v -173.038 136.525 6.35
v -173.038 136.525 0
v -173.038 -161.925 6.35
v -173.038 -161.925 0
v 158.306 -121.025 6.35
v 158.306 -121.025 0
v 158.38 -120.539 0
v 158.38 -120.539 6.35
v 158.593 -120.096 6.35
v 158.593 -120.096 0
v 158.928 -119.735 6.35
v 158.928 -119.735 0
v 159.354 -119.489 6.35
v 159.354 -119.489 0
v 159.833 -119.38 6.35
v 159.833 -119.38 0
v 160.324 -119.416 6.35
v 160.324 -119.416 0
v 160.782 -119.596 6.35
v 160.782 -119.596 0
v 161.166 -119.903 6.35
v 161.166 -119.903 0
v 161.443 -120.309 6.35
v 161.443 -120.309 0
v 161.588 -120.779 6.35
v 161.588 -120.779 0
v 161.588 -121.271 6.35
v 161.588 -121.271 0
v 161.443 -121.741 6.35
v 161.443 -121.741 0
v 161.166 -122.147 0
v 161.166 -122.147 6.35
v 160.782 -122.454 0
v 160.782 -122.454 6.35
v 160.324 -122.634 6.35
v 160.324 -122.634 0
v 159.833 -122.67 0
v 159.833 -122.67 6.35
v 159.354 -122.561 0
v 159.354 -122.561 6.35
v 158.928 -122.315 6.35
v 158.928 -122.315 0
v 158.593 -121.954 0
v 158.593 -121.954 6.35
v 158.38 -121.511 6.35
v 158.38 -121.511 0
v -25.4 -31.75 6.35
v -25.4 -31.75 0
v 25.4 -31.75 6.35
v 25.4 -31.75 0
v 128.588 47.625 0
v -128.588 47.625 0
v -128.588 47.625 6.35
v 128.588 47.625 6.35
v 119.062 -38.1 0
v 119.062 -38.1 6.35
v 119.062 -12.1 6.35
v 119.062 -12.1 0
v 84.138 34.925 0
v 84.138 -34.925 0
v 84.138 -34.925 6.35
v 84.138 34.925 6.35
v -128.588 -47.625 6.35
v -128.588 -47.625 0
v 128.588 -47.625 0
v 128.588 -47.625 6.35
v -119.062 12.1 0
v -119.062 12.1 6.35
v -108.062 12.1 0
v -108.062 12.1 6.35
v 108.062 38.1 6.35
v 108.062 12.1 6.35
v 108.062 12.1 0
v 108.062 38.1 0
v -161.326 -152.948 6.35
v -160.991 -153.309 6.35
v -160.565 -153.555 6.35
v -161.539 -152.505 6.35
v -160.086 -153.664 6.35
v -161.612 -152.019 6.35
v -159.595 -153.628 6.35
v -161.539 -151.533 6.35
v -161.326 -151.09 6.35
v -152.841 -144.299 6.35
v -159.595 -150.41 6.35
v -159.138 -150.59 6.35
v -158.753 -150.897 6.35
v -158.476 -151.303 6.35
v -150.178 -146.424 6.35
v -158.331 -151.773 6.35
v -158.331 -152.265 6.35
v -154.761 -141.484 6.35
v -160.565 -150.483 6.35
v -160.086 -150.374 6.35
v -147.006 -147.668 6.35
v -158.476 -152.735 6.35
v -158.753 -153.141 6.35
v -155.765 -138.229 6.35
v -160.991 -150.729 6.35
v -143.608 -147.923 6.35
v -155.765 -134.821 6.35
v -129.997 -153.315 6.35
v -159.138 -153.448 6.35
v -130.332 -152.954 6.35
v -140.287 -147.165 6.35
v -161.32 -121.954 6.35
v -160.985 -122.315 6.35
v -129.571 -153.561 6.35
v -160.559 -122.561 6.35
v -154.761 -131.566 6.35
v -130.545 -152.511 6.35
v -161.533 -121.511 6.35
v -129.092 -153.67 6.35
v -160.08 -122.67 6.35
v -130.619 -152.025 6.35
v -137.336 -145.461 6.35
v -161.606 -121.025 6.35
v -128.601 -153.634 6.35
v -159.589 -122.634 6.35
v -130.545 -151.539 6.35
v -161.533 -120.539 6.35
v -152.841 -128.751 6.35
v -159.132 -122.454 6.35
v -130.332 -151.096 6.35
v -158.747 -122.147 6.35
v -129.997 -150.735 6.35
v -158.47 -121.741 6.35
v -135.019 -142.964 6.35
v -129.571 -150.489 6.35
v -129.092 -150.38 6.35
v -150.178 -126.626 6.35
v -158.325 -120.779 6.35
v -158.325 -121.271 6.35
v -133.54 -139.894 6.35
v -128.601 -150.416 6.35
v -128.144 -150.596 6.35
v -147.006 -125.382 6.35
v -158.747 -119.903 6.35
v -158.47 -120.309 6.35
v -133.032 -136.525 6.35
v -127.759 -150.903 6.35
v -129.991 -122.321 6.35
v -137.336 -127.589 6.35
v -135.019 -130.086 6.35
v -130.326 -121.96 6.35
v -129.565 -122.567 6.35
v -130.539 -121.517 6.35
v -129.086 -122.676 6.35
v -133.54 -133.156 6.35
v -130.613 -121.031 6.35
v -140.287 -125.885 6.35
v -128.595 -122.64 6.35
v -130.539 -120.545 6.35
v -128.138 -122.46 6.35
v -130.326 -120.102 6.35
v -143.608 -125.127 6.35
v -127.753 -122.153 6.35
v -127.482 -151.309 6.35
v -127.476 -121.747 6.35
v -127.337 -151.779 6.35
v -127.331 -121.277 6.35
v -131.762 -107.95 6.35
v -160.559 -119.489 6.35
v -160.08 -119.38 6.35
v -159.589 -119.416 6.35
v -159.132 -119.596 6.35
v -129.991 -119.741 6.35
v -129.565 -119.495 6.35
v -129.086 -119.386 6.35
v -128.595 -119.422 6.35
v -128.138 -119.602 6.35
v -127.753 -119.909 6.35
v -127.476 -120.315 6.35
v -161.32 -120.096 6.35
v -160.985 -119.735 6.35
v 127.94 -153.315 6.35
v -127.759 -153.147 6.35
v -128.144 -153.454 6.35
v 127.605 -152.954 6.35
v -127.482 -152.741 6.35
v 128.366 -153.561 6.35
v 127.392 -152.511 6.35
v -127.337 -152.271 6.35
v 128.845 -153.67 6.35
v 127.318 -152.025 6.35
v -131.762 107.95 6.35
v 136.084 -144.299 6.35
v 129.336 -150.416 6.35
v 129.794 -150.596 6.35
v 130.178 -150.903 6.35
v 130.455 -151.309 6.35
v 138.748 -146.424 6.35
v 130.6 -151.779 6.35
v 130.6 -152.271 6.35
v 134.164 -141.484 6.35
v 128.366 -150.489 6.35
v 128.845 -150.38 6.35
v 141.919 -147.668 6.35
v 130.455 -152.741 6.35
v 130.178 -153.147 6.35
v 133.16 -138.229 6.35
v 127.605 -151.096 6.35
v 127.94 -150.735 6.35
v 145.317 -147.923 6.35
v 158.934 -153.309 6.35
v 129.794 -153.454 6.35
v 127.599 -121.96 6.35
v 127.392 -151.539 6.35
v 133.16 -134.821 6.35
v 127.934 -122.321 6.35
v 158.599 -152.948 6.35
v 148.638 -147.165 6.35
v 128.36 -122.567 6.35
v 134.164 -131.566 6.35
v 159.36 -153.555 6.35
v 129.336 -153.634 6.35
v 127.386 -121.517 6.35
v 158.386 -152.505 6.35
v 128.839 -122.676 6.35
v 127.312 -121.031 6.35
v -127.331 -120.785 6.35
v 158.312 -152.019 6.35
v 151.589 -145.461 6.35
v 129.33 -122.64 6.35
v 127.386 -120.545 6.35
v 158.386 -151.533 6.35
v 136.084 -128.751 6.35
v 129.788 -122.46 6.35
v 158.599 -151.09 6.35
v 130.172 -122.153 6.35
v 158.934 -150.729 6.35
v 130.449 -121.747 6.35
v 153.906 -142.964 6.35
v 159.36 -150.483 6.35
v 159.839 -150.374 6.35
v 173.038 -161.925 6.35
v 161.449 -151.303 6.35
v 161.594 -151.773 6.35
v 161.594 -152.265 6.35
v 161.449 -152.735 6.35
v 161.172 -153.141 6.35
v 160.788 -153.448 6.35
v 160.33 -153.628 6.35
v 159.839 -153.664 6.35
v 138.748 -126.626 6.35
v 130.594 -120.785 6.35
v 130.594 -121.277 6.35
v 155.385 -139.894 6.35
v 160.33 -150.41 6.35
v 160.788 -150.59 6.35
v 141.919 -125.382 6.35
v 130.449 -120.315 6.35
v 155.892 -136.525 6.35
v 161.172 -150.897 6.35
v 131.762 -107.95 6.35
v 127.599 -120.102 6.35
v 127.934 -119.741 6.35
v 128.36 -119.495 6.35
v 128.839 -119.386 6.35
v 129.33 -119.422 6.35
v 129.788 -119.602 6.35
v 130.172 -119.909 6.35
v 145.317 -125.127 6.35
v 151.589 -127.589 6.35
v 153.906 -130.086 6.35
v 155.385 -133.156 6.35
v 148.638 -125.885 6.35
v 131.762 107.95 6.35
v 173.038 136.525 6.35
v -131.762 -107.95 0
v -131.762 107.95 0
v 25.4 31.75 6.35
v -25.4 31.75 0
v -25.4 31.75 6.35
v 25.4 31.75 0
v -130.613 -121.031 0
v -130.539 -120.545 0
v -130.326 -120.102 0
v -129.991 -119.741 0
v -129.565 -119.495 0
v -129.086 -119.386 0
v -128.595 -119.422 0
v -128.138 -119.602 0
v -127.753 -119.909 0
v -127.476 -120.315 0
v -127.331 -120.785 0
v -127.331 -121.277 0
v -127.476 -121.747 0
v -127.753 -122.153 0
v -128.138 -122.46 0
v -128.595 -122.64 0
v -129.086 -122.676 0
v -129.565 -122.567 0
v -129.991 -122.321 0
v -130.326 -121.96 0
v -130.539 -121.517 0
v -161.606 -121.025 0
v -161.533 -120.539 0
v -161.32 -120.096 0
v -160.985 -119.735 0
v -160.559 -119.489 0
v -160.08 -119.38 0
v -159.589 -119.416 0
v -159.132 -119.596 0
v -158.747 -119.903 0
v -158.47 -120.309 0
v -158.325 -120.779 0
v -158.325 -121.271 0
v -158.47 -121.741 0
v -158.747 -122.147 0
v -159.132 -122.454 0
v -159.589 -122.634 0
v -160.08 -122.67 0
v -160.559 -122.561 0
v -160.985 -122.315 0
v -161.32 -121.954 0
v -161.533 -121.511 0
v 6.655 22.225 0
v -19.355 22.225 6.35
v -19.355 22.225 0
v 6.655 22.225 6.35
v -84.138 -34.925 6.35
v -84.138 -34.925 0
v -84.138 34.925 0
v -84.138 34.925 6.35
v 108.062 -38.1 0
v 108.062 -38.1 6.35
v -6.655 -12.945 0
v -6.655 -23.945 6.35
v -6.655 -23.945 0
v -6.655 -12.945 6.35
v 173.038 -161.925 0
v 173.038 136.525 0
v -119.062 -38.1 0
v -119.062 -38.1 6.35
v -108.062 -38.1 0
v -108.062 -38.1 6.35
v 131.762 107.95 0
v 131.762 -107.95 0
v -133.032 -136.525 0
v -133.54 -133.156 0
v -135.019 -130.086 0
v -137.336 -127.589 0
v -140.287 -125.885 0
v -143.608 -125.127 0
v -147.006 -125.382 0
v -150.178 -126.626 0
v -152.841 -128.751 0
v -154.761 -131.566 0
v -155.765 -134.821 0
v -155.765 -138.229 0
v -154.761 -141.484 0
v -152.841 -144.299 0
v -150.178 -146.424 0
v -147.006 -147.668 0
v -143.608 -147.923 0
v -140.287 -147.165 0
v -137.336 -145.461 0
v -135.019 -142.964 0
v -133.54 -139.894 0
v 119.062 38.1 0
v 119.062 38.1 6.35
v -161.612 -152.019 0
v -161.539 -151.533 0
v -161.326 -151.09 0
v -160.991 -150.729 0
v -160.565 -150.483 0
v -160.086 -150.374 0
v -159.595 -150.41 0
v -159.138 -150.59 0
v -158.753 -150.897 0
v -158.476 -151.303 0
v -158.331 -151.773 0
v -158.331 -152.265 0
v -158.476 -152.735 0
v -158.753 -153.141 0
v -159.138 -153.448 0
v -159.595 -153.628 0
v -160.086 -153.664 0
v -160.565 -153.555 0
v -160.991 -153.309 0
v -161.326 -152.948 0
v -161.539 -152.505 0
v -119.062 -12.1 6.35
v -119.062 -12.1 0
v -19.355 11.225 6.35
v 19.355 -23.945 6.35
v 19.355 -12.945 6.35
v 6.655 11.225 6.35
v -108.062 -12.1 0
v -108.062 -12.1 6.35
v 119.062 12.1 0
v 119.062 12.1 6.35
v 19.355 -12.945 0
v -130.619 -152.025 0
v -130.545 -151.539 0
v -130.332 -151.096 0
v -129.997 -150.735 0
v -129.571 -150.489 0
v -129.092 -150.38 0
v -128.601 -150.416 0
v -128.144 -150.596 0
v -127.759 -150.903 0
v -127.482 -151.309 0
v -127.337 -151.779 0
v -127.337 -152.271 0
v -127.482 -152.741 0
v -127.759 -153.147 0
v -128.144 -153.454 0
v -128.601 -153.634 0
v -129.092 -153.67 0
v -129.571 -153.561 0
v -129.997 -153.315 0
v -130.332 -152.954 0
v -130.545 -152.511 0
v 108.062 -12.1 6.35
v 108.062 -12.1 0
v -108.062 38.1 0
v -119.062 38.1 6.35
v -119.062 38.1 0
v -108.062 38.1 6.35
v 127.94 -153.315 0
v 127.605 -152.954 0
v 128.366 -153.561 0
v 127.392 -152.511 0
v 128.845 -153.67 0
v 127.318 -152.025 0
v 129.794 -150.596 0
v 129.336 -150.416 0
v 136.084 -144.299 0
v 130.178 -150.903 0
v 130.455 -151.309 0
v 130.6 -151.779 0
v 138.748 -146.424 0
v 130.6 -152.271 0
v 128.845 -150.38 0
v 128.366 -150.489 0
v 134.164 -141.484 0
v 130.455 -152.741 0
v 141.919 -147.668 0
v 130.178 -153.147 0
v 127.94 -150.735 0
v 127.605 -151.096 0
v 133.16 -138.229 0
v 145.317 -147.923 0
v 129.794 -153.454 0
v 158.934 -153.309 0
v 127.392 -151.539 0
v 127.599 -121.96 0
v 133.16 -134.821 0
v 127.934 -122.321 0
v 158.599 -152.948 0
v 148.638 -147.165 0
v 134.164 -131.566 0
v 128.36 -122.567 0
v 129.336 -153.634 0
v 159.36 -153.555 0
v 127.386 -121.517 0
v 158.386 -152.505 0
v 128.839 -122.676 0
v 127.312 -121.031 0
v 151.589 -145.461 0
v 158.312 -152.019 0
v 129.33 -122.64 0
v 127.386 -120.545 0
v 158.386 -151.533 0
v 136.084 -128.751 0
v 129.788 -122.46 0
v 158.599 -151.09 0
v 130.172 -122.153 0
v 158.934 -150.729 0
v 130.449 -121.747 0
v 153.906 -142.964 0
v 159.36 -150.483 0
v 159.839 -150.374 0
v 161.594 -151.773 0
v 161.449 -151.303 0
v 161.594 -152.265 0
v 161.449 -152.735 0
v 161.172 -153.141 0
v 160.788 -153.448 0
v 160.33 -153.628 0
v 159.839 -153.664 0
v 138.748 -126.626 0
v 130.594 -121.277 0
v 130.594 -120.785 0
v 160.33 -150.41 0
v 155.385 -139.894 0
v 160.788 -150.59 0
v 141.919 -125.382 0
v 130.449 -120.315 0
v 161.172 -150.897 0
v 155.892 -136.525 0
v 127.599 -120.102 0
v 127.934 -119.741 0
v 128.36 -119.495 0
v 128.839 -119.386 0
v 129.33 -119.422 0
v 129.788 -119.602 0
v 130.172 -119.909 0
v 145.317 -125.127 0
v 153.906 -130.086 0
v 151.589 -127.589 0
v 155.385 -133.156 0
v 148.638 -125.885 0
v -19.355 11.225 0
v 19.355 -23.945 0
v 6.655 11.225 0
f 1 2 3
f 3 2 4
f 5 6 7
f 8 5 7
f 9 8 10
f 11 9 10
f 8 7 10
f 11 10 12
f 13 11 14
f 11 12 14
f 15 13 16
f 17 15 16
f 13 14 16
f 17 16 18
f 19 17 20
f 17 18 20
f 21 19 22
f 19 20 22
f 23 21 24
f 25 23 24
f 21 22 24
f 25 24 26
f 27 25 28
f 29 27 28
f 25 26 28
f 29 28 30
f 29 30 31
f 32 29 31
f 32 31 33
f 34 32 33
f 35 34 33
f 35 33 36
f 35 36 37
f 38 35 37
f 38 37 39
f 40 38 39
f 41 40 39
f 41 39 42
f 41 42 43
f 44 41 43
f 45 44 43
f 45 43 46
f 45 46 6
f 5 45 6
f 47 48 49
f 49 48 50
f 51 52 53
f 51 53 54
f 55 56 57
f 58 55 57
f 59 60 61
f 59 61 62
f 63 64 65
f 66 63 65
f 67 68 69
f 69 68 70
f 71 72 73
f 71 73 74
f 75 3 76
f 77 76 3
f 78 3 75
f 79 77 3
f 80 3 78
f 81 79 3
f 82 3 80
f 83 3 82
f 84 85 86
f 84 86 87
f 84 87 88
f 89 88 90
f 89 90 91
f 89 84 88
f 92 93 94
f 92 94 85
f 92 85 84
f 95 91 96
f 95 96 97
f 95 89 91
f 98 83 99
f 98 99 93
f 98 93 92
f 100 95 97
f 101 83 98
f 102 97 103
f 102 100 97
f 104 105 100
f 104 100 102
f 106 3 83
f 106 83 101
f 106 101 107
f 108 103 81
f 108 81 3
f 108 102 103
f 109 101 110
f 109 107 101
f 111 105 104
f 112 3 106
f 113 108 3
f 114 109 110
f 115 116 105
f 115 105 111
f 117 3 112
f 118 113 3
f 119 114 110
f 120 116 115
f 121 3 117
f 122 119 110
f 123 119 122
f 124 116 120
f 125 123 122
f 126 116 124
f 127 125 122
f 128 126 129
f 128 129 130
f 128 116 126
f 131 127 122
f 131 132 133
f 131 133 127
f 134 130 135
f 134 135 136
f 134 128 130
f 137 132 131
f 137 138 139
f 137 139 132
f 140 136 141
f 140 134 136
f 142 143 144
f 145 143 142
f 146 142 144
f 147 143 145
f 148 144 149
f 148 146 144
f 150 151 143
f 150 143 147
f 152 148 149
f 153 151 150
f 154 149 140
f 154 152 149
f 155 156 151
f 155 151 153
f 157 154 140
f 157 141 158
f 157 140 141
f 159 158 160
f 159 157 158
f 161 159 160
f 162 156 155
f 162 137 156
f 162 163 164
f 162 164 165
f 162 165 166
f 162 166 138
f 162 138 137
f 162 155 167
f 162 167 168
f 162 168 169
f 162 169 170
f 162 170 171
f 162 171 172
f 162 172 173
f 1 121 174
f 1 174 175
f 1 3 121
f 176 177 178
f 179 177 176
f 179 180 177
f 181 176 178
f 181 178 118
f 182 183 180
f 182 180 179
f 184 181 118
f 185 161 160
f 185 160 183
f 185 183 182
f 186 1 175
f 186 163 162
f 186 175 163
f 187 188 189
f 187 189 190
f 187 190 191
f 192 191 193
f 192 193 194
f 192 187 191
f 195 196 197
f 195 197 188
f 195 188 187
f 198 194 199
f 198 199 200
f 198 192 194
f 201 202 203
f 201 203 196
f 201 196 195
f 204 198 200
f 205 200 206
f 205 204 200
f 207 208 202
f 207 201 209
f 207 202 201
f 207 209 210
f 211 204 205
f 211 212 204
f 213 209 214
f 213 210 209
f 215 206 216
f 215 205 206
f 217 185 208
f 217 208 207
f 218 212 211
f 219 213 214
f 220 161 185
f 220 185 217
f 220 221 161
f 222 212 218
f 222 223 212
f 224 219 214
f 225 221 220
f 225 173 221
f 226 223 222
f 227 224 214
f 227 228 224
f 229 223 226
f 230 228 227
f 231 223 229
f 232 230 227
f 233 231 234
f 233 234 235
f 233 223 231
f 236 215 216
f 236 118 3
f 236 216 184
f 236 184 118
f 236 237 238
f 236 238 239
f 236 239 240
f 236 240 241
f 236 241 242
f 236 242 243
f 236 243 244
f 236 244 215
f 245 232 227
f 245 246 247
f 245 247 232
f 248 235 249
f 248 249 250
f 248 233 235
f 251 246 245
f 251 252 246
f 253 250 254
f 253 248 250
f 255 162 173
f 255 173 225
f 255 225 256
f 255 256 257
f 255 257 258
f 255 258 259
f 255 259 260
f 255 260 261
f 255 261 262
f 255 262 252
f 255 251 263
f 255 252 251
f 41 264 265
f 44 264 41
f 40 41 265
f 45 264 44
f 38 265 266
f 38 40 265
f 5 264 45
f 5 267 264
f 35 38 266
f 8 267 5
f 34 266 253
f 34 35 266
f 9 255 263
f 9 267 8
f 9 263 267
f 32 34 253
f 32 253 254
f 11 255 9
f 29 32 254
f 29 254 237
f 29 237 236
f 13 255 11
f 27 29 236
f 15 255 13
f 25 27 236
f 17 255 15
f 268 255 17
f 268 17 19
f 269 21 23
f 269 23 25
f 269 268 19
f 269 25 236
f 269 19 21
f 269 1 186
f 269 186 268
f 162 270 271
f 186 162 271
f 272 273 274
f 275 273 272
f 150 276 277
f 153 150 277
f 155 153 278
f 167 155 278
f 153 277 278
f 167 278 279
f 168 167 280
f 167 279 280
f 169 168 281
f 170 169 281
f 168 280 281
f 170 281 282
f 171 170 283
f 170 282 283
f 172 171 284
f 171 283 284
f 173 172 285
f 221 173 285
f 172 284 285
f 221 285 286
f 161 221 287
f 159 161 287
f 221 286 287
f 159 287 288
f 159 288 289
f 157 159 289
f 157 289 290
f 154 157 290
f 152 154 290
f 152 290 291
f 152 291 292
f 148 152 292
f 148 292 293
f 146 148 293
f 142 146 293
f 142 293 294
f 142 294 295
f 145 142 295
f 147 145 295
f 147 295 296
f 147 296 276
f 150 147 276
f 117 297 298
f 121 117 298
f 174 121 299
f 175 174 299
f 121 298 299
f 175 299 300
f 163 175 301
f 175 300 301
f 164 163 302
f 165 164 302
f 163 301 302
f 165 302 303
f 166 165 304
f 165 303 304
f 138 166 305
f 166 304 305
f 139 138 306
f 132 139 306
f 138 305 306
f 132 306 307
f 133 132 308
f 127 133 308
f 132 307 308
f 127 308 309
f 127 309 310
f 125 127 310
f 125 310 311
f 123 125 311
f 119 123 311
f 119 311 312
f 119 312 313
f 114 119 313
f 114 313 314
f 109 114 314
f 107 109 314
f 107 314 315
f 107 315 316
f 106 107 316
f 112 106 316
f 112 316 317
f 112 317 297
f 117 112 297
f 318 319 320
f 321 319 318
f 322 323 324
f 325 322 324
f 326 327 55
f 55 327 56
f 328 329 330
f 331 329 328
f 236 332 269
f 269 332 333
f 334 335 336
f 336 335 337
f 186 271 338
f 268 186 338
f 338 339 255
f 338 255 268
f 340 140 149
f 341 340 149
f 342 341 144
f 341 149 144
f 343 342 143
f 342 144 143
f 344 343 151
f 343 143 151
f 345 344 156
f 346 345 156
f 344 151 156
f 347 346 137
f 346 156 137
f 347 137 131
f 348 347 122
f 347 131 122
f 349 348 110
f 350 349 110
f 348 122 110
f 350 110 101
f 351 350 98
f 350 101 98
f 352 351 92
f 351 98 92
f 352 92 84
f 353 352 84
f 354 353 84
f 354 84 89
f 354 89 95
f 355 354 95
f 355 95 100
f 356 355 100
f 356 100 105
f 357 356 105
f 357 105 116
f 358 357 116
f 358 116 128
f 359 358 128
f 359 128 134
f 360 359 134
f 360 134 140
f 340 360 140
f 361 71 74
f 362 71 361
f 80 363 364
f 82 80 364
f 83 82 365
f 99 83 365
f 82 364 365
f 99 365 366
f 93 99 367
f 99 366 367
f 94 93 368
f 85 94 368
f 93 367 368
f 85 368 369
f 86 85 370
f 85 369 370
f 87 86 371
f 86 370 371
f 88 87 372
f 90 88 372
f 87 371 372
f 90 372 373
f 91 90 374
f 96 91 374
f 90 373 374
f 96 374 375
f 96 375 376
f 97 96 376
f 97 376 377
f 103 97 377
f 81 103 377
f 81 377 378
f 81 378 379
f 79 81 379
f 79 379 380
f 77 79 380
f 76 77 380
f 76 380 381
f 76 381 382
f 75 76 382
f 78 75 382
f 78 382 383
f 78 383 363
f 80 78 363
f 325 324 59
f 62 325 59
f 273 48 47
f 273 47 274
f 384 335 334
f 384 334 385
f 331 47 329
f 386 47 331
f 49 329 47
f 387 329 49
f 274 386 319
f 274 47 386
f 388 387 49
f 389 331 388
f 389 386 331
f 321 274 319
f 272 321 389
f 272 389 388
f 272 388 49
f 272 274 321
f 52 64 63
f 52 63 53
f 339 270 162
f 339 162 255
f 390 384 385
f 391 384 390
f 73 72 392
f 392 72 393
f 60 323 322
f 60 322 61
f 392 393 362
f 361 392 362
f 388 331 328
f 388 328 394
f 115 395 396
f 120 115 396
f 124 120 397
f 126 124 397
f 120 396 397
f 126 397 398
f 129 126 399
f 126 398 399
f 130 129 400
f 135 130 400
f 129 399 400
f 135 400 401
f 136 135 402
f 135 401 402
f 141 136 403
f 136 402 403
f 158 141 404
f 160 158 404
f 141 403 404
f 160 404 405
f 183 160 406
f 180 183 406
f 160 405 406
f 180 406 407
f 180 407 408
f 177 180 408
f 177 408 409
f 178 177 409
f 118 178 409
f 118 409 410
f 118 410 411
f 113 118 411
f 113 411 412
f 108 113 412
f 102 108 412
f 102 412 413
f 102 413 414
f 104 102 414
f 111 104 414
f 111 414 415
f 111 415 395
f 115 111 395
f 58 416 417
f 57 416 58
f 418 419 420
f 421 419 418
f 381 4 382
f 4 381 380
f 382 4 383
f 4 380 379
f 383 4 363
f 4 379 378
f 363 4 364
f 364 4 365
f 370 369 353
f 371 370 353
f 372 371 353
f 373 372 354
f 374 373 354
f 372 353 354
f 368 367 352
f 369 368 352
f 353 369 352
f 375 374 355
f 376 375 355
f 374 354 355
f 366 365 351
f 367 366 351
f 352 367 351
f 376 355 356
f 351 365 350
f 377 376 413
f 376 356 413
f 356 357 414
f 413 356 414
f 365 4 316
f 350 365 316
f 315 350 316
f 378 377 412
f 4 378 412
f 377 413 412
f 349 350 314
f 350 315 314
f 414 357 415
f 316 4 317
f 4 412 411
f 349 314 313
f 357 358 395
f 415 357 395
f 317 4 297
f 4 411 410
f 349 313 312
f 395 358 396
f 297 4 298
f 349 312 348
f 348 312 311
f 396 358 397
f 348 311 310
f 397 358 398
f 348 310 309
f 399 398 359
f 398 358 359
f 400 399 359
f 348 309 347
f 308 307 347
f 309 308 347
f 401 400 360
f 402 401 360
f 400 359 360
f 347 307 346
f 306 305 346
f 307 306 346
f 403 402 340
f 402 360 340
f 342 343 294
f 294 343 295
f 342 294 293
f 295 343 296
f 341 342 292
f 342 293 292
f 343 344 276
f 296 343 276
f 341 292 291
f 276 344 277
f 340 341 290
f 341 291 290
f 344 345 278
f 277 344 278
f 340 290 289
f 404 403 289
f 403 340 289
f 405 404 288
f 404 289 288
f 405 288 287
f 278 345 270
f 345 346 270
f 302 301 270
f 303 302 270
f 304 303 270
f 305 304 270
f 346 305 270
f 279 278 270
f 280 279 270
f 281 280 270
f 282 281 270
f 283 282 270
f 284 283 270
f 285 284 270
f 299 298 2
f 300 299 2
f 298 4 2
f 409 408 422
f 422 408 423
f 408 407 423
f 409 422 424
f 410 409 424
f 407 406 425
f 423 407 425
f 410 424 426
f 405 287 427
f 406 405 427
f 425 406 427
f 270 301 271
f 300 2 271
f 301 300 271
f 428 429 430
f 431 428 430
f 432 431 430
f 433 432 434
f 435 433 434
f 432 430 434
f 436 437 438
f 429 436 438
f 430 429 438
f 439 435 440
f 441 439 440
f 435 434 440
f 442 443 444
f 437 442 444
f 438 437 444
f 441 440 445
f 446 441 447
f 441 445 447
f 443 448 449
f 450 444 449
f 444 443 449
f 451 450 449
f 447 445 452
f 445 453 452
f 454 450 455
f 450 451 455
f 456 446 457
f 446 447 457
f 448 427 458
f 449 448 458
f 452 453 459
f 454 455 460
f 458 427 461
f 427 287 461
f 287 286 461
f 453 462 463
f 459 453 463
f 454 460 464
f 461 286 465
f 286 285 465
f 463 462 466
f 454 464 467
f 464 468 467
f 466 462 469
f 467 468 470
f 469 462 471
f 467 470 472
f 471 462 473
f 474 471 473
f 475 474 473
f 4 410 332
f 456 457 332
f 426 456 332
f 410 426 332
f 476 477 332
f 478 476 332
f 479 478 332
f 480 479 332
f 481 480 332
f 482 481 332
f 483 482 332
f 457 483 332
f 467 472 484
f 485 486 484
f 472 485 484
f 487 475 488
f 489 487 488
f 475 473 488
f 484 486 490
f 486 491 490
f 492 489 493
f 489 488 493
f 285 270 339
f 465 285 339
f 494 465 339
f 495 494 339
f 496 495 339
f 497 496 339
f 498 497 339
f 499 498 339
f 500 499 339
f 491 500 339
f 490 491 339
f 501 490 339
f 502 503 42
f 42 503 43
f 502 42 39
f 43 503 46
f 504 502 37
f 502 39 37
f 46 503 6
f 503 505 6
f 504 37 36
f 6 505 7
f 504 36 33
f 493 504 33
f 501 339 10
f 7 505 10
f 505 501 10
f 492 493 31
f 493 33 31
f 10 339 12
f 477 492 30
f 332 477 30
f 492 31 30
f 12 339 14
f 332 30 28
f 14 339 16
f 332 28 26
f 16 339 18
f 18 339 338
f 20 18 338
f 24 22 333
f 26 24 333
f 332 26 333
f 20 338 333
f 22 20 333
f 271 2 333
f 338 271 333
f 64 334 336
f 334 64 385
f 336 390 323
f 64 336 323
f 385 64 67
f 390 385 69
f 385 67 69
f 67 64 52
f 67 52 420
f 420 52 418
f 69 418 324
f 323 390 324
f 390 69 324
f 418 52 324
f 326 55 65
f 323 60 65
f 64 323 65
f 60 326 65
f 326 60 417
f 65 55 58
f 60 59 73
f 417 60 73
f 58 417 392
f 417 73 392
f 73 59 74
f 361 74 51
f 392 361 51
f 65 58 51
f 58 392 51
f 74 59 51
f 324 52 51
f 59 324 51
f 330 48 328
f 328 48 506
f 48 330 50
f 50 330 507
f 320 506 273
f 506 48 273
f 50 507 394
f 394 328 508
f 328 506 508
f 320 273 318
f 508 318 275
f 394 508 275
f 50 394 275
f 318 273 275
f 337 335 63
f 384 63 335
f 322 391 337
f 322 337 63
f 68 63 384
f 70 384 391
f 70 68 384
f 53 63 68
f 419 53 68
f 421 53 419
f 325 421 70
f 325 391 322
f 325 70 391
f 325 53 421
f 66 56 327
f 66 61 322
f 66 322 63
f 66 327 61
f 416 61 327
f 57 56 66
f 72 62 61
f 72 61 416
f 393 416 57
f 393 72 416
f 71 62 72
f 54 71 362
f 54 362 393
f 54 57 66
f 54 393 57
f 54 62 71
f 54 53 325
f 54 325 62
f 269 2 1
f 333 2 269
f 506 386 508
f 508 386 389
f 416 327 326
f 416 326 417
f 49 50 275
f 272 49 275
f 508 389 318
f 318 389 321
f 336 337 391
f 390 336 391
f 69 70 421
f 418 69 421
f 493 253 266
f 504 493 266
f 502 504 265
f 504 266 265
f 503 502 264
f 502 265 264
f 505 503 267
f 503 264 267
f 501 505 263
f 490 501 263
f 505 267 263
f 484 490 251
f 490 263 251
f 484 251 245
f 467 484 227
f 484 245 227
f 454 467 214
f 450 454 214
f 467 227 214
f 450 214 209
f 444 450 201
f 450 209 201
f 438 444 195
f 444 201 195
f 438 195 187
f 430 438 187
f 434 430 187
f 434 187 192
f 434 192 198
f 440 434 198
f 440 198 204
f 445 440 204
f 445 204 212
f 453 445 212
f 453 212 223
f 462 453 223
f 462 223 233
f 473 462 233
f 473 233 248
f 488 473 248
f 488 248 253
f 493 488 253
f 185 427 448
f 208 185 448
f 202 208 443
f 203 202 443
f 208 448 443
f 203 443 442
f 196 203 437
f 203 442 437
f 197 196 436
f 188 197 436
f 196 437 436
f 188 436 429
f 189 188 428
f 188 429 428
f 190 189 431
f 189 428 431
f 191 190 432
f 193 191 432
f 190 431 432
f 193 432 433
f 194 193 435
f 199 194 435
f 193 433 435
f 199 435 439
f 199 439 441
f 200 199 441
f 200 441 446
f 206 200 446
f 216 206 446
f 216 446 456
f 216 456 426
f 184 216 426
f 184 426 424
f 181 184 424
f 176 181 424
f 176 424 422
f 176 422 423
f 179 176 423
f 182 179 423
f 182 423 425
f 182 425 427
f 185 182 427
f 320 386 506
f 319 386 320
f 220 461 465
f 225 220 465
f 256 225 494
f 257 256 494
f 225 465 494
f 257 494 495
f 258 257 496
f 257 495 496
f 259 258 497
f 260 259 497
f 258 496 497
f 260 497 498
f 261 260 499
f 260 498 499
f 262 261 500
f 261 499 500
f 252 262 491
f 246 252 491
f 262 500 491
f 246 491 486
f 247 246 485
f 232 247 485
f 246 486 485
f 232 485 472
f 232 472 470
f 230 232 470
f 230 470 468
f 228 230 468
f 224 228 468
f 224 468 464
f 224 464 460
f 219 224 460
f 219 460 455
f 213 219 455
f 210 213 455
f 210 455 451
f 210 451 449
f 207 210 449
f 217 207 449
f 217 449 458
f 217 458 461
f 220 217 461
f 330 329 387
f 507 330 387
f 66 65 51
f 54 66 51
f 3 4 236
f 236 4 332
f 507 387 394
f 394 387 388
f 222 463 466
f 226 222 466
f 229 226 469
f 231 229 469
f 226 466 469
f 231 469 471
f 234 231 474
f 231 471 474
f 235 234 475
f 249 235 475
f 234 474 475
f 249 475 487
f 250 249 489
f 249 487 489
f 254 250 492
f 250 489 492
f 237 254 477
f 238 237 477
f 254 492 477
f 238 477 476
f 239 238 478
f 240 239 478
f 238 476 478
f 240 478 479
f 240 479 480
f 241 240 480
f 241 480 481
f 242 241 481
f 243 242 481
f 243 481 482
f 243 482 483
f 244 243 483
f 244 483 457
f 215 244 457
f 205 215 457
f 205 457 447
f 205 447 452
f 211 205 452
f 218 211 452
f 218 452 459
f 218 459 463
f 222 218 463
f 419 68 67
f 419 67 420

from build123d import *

# Parameters (mm, degrees)
F0_W     = 257.175
F0_H     = 95.25
F0_W_2   = 168.275
F0_H_2   = 69.85
F1_DEPTH = 6.35
F0_W_3   = 50.8
F0_H_3   = 63.5
F2_DEPTH = 6.35
F0_W_4   = 346.075
F0_H_4   = 273.05
F0_W_5   = 263.525
F0_H_5   = 215.9
F0_H_6   = 25.4
F3_DEPTH = 6.35
F4_R     = 11.43
F5_DEPTH = 25.4
F6_D     = 3.3
F7_W     = 11
F7_H     = 26
F7_W_2   = 26.0096
F7_H_2   = 11
F8_DEPTH = 25.4


with BuildPart() as f1:
    # F0 (on Top) → F1 (new body)
    with BuildSketch(Plane.XY):
        Rectangle(F0_W, F0_H)
        Rectangle(F0_W_2, F0_H_2, mode=Mode.SUBTRACT)
    extrude(amount=F1_DEPTH)


with BuildPart() as f2:
    # F0 (on Top) → F2 (new body)
    with BuildSketch(Plane.XY):
        Rectangle(F0_W_3, F0_H_3)
    extrude(amount=F2_DEPTH)


with BuildPart() as f3:
    # F0 (on Top) → F3 (new body)
    with BuildSketch(Plane.XY):
        Rectangle(F0_W_4, F0_H_4)
        Rectangle(F0_W_5, F0_H_5, mode=Mode.SUBTRACT)
        with Locations((0, -149.225)):
            Rectangle(F0_W_4, F0_H_6)
    extrude(amount=F3_DEPTH)

    # F4 (on face) → F5 (cut)
    with BuildSketch(Plane.XY.offset(6.35)):
        with Locations((-144.4625, -136.525)):
            Circle(F4_R)
        with Locations((144.4625, -136.525)):
            Circle(F4_R)
    extrude(amount=-F5_DEPTH, mode=Mode.SUBTRACT)

    # F6 (through all)
    with Locations(Plane.XY.offset(6.35)):
        with Locations((-159.9565, -121.025), (-128.9625, -121.031), (-128.9685, -152.025), (-159.9625, -152.019), (128.9625, -121.031), (159.9565, -121.025), (128.9685, -152.025), (159.9625, -152.019)):
            Hole(F6_D / 2)


with BuildPart() as f8_tool:
    # F7 (on face) → F8 (new body)
    with BuildSketch(Plane.XY.offset(6.35)):
        with Locations((-113.5625, -25.1)):
            Rectangle(F7_W, F7_H)
        with Locations((-113.5625, 25.1)):
            Rectangle(F7_W, F7_H)
        with Locations((-6.35, 16.725)):
            Rectangle(F7_W_2, F7_H_2)
        with Locations((113.5625, -25.1)):
            Rectangle(F7_W, F7_H)
        with Locations((113.5625, 25.1)):
            Rectangle(F7_W, F7_H)
        with Locations((6.35, -18.4449124783)):
            Rectangle(F7_W_2, F7_H_2)
    extrude(amount=-F8_DEPTH)


with BuildPart() as f1_1:
    add(f1.part)

    # F8: cut by f8_tool
    add(f8_tool.part, mode=Mode.SUBTRACT)


with BuildPart() as f2_1:
    add(f2.part)

    # F8: cut by f8_tool
    add(f8_tool.part, mode=Mode.SUBTRACT)


solid = Compound([f3.part, f1_1.part, f2_1.part])
